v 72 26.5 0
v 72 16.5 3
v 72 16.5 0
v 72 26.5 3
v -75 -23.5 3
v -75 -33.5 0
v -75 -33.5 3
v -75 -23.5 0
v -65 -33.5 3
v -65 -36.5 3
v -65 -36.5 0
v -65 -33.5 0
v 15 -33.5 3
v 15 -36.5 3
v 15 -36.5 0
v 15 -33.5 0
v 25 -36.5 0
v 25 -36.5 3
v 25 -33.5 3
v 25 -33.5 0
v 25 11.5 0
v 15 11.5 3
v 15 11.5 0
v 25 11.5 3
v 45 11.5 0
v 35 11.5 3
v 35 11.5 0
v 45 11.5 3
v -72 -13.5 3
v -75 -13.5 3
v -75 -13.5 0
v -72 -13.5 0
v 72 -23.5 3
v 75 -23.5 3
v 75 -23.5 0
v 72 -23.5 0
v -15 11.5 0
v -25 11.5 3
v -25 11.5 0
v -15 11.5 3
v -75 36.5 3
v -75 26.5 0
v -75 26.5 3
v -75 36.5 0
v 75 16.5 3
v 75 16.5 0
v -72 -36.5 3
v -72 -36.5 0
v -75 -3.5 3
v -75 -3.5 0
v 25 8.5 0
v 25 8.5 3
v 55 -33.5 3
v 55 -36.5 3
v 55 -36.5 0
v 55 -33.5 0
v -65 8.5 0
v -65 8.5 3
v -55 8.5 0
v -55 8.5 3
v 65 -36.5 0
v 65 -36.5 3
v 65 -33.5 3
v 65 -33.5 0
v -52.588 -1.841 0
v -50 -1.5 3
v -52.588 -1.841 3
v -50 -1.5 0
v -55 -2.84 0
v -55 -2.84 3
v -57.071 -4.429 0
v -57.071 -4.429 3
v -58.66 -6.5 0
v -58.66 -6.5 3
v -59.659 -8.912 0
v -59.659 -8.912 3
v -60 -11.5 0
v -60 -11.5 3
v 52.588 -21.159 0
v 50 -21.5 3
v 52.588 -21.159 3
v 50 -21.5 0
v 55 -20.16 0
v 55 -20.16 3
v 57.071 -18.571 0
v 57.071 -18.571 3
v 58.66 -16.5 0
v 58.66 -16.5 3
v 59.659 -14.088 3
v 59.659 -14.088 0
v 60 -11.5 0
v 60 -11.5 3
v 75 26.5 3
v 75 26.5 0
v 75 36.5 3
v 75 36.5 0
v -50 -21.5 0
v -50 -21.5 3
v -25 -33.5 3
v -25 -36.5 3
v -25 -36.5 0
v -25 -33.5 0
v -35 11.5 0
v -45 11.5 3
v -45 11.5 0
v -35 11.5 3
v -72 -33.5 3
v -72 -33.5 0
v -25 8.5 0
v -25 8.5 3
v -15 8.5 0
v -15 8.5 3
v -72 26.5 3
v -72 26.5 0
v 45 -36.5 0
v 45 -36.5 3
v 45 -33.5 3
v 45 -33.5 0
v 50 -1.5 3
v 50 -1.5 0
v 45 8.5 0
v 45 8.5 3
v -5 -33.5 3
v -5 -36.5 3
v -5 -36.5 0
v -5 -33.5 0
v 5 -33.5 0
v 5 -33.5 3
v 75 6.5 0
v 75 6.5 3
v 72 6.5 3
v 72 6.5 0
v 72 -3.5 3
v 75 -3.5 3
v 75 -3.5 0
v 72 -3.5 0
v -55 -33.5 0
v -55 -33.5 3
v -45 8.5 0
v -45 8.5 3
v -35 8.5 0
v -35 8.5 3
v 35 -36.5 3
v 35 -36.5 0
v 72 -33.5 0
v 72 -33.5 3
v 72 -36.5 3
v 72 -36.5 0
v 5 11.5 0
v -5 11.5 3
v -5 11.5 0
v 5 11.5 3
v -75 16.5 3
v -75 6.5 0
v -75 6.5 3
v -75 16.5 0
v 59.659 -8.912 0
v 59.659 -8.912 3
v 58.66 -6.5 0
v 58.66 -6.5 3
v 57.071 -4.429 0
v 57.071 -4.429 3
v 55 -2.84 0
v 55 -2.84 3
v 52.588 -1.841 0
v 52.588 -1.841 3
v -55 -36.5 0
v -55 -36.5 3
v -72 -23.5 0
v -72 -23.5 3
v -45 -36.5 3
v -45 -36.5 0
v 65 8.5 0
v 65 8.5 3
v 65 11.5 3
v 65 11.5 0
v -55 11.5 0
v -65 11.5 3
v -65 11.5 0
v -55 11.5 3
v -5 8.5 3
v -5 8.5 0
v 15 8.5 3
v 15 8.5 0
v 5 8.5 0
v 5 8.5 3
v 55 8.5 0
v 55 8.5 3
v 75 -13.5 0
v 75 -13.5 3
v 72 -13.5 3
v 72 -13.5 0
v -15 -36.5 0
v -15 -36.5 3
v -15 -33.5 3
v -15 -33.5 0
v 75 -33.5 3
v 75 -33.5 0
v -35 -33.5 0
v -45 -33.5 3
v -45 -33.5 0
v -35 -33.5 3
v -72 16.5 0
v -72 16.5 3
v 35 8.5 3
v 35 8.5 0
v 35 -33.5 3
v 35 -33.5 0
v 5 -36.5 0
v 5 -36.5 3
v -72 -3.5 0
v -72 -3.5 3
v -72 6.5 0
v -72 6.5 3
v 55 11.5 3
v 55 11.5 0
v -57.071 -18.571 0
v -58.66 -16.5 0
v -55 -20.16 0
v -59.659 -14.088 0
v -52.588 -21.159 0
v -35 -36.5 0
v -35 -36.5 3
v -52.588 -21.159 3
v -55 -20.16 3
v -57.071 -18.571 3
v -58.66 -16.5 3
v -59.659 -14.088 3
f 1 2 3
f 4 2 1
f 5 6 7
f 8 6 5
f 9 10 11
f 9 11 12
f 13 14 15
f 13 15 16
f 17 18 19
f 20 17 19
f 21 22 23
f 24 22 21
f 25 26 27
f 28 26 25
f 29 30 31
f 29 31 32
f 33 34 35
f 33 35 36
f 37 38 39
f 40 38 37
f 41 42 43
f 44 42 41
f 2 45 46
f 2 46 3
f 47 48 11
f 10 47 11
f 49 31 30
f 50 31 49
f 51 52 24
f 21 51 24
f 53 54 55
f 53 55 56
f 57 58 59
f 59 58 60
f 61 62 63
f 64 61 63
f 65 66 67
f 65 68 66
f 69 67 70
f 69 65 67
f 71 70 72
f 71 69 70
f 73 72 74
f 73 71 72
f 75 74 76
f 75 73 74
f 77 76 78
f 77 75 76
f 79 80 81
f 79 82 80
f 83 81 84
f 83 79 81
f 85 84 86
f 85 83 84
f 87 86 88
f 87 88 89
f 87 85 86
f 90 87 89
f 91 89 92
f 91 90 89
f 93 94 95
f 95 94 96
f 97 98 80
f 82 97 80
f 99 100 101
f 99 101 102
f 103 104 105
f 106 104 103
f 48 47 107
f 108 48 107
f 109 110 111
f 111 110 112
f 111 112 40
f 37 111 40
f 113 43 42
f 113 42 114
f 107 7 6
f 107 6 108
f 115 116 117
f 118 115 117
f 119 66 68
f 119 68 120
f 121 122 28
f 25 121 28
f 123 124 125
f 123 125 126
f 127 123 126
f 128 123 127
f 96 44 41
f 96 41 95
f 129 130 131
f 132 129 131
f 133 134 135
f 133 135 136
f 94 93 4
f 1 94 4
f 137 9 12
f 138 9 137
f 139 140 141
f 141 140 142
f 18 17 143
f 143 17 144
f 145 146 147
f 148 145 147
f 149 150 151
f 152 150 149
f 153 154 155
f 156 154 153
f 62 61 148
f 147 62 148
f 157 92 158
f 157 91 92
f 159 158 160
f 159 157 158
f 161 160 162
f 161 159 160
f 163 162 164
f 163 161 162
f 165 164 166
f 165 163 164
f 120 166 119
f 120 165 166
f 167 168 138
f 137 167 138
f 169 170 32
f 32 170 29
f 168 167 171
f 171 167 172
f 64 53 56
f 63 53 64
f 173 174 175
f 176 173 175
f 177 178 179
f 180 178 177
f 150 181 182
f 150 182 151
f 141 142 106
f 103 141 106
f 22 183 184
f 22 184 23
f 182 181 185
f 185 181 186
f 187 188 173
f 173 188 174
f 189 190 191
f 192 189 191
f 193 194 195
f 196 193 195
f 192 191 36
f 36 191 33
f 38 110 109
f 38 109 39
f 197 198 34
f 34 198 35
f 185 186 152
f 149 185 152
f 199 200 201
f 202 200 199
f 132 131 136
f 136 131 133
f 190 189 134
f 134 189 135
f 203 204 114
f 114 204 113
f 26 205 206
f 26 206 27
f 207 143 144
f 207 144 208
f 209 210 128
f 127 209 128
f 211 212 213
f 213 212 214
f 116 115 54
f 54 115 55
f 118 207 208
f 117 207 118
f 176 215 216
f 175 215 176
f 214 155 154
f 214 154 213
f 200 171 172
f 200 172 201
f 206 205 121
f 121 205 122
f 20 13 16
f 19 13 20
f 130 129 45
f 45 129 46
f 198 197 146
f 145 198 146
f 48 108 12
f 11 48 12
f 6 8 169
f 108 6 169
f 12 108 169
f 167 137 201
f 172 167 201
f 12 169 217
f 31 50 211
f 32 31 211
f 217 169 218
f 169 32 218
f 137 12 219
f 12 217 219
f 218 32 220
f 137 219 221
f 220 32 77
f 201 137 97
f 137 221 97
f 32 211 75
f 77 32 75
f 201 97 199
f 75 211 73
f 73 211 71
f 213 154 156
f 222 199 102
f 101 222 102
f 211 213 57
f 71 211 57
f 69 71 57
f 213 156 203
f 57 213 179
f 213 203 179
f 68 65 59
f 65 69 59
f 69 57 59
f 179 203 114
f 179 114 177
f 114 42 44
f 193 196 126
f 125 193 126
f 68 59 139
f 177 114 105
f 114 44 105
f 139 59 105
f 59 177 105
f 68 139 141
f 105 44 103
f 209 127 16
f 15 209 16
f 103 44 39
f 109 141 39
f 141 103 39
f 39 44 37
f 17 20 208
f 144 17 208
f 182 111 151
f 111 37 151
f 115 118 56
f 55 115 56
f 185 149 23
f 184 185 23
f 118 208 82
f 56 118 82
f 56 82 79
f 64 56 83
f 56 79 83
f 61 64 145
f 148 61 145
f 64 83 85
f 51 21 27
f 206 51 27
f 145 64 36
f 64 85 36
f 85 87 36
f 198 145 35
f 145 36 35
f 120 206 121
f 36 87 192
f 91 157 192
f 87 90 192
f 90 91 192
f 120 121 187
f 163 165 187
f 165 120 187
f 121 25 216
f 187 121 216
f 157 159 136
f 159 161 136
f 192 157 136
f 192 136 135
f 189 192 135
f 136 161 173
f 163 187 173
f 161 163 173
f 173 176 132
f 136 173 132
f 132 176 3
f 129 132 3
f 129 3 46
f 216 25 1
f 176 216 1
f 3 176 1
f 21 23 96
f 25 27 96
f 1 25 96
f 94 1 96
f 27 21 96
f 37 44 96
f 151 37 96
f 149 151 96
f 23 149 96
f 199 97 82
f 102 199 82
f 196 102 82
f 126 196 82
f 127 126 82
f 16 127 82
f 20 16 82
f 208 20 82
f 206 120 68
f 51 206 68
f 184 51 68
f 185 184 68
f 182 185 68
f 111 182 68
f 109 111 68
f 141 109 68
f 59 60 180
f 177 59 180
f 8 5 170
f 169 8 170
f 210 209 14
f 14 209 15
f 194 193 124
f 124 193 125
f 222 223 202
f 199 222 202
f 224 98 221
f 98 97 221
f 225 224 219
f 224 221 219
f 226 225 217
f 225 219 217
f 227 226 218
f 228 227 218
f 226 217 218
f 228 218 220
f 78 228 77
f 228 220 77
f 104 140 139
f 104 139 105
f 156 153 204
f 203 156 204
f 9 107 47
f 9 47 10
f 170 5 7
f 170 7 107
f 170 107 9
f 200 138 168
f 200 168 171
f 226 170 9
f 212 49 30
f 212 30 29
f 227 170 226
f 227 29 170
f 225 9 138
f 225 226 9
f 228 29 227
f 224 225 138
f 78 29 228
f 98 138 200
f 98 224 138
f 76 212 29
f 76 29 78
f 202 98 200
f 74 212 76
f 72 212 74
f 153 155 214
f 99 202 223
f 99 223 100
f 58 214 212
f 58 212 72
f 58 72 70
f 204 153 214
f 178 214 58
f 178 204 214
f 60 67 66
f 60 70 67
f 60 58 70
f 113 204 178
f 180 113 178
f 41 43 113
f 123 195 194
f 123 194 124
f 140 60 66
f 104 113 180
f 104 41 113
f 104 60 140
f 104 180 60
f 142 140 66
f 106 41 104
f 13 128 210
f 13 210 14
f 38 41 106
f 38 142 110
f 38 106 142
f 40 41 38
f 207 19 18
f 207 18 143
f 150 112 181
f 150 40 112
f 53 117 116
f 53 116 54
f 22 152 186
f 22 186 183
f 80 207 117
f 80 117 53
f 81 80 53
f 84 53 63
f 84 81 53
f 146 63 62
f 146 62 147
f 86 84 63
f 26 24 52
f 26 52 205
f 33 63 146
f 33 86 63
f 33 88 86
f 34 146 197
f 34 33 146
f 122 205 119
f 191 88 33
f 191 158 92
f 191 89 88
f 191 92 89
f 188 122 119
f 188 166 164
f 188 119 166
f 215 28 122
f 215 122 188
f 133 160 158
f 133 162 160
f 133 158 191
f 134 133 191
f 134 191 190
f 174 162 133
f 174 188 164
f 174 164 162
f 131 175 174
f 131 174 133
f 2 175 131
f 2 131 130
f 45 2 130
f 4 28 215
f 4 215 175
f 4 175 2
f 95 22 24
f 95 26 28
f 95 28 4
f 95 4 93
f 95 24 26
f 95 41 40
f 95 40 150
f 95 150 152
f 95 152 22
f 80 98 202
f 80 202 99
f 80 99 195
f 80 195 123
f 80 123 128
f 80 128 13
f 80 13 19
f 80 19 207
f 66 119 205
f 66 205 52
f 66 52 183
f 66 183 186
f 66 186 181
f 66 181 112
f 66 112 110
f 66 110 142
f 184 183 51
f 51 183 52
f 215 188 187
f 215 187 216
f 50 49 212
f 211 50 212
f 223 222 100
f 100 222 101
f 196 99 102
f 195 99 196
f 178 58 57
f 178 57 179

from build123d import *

# Parameters (mm, degrees)
SKETCH1_W               = 150
SKETCH1_H               = 73
BOSS_EXTRUDE1_DEPTH     = 3
SKETCH2_W               = 3
SKETCH2_H               = 10
CUT_EXTRUDE1_DEPTH      = 84.464064123
LPATTERN1_COUNT         = 4
LPATTERN1_PITCH         = 20
MIRROR3_COPY_1_SKETCH_W = 3
MIRROR3_COPY_1_SKETCH_H = 10
MIRROR3_COPY_1_DEPTH    = 84.464064123
MIRROR3_COPY_2_SKETCH_W = 3
MIRROR3_COPY_2_SKETCH_H = 10
MIRROR3_COPY_2_DEPTH    = 84.464064123
MIRROR3_COPY_3_SKETCH_W = 3
MIRROR3_COPY_3_SKETCH_H = 10
MIRROR3_COPY_3_DEPTH    = 84.464064123
SKETCH4_W               = 10
SKETCH4_H               = 3
CUT_EXTRUDE3_DEPTH      = 84.464064123
LPATTERN2_COUNT         = 8
LPATTERN2_PITCH         = 20
SKETCH5_W               = 10
SKETCH5_H               = 3
CUT_EXTRUDE4_DEPTH      = 84.464064123
LPATTERN4_COUNT         = 7
LPATTERN4_PITCH         = 20
SKETCH6_W               = 120
SKETCH6_H               = 20
CUT_EXTRUDE5_DEPTH      = 84.464064123
FILLET1_R               = 10


with BuildPart() as part:
    # Sketch1 → Boss-Extrude1 (new body)
    with BuildSketch(Plane.XY):
        Rectangle(SKETCH1_W, SKETCH1_H)
    extrude(amount=BOSS_EXTRUDE1_DEPTH)

    # Sketch2 → Cut-Extrude1 (cut, through all)
    with BuildSketch(Plane.XY.offset(3)):
        with Locations((-73.5, 21.5)):
            Rectangle(SKETCH2_W, SKETCH2_H)
    cut_extrude1 = extrude(amount=-CUT_EXTRUDE1_DEPTH, mode=Mode.SUBTRACT)

    # LPattern1: Cut-Extrude1 ×4
    with Locations(*[(0, -i * LPATTERN1_PITCH, 0) for i in range(1, LPATTERN1_COUNT)]):
        add(cut_extrude1, mode=Mode.SUBTRACT)

    # Mirror3: Cut-Extrude1 across plane
    add(cut_extrude1.mirror(Plane(origin=(0, 0, 0), x_dir=(0, 0, 1), z_dir=(1, 0, 0))), mode=Mode.SUBTRACT)

    # Mirror3 copy 1 sketch → Mirror3 copy 1 (cut, through all)
    with BuildSketch(Plane(origin=(0, -20, 3), x_dir=(-1, 0, 0), z_dir=(0, 0, 1))):
        with Locations((-73.5, -21.5)):
            Rectangle(MIRROR3_COPY_1_SKETCH_W, MIRROR3_COPY_1_SKETCH_H)
    extrude(amount=-MIRROR3_COPY_1_DEPTH, mode=Mode.SUBTRACT)

    # Mirror3 copy 2 sketch → Mirror3 copy 2 (cut, through all)
    with BuildSketch(Plane(origin=(0, -40, 3), x_dir=(-1, 0, 0), z_dir=(0, 0, 1))):
        with Locations((-73.5, -21.5)):
            Rectangle(MIRROR3_COPY_2_SKETCH_W, MIRROR3_COPY_2_SKETCH_H)
    extrude(amount=-MIRROR3_COPY_2_DEPTH, mode=Mode.SUBTRACT)

    # Mirror3 copy 3 sketch → Mirror3 copy 3 (cut, through all)
    with BuildSketch(Plane(origin=(0, -60, 3), x_dir=(-1, 0, 0), z_dir=(0, 0, 1))):
        with Locations((-73.5, -21.5)):
            Rectangle(MIRROR3_COPY_3_SKETCH_W, MIRROR3_COPY_3_SKETCH_H)
    extrude(amount=-MIRROR3_COPY_3_DEPTH, mode=Mode.SUBTRACT)

    # Sketch4 → Cut-Extrude3 (cut, through all)
    with BuildSketch(Plane.XY.offset(3)):
        with Locations((60, -35)):
            Rectangle(SKETCH4_W, SKETCH4_H)
    cut_extrude3 = extrude(amount=-CUT_EXTRUDE3_DEPTH, mode=Mode.SUBTRACT)

    # LPattern2: Cut-Extrude3 ×8
    with Locations(*[(-i * LPATTERN2_PITCH, 0, 0) for i in range(1, LPATTERN2_COUNT)]):
        add(cut_extrude3, mode=Mode.SUBTRACT)

    # Sketch5 → Cut-Extrude4 (cut, through all)
    with BuildSketch(Plane.XY.offset(3)):
        with Locations((-60, 10)):
            Rectangle(SKETCH5_W, SKETCH5_H)
    cut_extrude4 = extrude(amount=-CUT_EXTRUDE4_DEPTH, mode=Mode.SUBTRACT)

    # LPattern4: Cut-Extrude4 ×7
    with Locations(*[(i * LPATTERN4_PITCH, 0, 0) for i in range(1, LPATTERN4_COUNT)]):
        add(cut_extrude4, mode=Mode.SUBTRACT)

    # Sketch6 → Cut-Extrude5 (cut, through all)
    with BuildSketch(Plane.XY.offset(3)):
        with Locations((0, -11.5)):
            Rectangle(SKETCH6_W, SKETCH6_H)
    extrude(amount=-CUT_EXTRUDE5_DEPTH, mode=Mode.SUBTRACT)

    # Fillet1
    fillet1_edges = [part.edges().sort_by_distance(p)[0] for p in [
        (60, -1.5, 1.5),
        (60, -21.5, 1.5),
        (-60, -1.5, 1.5),
        (-60, -21.5, 1.5),
    ]]
    fillet(fillet1_edges, radius=FILLET1_R - 0.0001)  # a hair under: the kernel refuses the full size


solid = part.part
